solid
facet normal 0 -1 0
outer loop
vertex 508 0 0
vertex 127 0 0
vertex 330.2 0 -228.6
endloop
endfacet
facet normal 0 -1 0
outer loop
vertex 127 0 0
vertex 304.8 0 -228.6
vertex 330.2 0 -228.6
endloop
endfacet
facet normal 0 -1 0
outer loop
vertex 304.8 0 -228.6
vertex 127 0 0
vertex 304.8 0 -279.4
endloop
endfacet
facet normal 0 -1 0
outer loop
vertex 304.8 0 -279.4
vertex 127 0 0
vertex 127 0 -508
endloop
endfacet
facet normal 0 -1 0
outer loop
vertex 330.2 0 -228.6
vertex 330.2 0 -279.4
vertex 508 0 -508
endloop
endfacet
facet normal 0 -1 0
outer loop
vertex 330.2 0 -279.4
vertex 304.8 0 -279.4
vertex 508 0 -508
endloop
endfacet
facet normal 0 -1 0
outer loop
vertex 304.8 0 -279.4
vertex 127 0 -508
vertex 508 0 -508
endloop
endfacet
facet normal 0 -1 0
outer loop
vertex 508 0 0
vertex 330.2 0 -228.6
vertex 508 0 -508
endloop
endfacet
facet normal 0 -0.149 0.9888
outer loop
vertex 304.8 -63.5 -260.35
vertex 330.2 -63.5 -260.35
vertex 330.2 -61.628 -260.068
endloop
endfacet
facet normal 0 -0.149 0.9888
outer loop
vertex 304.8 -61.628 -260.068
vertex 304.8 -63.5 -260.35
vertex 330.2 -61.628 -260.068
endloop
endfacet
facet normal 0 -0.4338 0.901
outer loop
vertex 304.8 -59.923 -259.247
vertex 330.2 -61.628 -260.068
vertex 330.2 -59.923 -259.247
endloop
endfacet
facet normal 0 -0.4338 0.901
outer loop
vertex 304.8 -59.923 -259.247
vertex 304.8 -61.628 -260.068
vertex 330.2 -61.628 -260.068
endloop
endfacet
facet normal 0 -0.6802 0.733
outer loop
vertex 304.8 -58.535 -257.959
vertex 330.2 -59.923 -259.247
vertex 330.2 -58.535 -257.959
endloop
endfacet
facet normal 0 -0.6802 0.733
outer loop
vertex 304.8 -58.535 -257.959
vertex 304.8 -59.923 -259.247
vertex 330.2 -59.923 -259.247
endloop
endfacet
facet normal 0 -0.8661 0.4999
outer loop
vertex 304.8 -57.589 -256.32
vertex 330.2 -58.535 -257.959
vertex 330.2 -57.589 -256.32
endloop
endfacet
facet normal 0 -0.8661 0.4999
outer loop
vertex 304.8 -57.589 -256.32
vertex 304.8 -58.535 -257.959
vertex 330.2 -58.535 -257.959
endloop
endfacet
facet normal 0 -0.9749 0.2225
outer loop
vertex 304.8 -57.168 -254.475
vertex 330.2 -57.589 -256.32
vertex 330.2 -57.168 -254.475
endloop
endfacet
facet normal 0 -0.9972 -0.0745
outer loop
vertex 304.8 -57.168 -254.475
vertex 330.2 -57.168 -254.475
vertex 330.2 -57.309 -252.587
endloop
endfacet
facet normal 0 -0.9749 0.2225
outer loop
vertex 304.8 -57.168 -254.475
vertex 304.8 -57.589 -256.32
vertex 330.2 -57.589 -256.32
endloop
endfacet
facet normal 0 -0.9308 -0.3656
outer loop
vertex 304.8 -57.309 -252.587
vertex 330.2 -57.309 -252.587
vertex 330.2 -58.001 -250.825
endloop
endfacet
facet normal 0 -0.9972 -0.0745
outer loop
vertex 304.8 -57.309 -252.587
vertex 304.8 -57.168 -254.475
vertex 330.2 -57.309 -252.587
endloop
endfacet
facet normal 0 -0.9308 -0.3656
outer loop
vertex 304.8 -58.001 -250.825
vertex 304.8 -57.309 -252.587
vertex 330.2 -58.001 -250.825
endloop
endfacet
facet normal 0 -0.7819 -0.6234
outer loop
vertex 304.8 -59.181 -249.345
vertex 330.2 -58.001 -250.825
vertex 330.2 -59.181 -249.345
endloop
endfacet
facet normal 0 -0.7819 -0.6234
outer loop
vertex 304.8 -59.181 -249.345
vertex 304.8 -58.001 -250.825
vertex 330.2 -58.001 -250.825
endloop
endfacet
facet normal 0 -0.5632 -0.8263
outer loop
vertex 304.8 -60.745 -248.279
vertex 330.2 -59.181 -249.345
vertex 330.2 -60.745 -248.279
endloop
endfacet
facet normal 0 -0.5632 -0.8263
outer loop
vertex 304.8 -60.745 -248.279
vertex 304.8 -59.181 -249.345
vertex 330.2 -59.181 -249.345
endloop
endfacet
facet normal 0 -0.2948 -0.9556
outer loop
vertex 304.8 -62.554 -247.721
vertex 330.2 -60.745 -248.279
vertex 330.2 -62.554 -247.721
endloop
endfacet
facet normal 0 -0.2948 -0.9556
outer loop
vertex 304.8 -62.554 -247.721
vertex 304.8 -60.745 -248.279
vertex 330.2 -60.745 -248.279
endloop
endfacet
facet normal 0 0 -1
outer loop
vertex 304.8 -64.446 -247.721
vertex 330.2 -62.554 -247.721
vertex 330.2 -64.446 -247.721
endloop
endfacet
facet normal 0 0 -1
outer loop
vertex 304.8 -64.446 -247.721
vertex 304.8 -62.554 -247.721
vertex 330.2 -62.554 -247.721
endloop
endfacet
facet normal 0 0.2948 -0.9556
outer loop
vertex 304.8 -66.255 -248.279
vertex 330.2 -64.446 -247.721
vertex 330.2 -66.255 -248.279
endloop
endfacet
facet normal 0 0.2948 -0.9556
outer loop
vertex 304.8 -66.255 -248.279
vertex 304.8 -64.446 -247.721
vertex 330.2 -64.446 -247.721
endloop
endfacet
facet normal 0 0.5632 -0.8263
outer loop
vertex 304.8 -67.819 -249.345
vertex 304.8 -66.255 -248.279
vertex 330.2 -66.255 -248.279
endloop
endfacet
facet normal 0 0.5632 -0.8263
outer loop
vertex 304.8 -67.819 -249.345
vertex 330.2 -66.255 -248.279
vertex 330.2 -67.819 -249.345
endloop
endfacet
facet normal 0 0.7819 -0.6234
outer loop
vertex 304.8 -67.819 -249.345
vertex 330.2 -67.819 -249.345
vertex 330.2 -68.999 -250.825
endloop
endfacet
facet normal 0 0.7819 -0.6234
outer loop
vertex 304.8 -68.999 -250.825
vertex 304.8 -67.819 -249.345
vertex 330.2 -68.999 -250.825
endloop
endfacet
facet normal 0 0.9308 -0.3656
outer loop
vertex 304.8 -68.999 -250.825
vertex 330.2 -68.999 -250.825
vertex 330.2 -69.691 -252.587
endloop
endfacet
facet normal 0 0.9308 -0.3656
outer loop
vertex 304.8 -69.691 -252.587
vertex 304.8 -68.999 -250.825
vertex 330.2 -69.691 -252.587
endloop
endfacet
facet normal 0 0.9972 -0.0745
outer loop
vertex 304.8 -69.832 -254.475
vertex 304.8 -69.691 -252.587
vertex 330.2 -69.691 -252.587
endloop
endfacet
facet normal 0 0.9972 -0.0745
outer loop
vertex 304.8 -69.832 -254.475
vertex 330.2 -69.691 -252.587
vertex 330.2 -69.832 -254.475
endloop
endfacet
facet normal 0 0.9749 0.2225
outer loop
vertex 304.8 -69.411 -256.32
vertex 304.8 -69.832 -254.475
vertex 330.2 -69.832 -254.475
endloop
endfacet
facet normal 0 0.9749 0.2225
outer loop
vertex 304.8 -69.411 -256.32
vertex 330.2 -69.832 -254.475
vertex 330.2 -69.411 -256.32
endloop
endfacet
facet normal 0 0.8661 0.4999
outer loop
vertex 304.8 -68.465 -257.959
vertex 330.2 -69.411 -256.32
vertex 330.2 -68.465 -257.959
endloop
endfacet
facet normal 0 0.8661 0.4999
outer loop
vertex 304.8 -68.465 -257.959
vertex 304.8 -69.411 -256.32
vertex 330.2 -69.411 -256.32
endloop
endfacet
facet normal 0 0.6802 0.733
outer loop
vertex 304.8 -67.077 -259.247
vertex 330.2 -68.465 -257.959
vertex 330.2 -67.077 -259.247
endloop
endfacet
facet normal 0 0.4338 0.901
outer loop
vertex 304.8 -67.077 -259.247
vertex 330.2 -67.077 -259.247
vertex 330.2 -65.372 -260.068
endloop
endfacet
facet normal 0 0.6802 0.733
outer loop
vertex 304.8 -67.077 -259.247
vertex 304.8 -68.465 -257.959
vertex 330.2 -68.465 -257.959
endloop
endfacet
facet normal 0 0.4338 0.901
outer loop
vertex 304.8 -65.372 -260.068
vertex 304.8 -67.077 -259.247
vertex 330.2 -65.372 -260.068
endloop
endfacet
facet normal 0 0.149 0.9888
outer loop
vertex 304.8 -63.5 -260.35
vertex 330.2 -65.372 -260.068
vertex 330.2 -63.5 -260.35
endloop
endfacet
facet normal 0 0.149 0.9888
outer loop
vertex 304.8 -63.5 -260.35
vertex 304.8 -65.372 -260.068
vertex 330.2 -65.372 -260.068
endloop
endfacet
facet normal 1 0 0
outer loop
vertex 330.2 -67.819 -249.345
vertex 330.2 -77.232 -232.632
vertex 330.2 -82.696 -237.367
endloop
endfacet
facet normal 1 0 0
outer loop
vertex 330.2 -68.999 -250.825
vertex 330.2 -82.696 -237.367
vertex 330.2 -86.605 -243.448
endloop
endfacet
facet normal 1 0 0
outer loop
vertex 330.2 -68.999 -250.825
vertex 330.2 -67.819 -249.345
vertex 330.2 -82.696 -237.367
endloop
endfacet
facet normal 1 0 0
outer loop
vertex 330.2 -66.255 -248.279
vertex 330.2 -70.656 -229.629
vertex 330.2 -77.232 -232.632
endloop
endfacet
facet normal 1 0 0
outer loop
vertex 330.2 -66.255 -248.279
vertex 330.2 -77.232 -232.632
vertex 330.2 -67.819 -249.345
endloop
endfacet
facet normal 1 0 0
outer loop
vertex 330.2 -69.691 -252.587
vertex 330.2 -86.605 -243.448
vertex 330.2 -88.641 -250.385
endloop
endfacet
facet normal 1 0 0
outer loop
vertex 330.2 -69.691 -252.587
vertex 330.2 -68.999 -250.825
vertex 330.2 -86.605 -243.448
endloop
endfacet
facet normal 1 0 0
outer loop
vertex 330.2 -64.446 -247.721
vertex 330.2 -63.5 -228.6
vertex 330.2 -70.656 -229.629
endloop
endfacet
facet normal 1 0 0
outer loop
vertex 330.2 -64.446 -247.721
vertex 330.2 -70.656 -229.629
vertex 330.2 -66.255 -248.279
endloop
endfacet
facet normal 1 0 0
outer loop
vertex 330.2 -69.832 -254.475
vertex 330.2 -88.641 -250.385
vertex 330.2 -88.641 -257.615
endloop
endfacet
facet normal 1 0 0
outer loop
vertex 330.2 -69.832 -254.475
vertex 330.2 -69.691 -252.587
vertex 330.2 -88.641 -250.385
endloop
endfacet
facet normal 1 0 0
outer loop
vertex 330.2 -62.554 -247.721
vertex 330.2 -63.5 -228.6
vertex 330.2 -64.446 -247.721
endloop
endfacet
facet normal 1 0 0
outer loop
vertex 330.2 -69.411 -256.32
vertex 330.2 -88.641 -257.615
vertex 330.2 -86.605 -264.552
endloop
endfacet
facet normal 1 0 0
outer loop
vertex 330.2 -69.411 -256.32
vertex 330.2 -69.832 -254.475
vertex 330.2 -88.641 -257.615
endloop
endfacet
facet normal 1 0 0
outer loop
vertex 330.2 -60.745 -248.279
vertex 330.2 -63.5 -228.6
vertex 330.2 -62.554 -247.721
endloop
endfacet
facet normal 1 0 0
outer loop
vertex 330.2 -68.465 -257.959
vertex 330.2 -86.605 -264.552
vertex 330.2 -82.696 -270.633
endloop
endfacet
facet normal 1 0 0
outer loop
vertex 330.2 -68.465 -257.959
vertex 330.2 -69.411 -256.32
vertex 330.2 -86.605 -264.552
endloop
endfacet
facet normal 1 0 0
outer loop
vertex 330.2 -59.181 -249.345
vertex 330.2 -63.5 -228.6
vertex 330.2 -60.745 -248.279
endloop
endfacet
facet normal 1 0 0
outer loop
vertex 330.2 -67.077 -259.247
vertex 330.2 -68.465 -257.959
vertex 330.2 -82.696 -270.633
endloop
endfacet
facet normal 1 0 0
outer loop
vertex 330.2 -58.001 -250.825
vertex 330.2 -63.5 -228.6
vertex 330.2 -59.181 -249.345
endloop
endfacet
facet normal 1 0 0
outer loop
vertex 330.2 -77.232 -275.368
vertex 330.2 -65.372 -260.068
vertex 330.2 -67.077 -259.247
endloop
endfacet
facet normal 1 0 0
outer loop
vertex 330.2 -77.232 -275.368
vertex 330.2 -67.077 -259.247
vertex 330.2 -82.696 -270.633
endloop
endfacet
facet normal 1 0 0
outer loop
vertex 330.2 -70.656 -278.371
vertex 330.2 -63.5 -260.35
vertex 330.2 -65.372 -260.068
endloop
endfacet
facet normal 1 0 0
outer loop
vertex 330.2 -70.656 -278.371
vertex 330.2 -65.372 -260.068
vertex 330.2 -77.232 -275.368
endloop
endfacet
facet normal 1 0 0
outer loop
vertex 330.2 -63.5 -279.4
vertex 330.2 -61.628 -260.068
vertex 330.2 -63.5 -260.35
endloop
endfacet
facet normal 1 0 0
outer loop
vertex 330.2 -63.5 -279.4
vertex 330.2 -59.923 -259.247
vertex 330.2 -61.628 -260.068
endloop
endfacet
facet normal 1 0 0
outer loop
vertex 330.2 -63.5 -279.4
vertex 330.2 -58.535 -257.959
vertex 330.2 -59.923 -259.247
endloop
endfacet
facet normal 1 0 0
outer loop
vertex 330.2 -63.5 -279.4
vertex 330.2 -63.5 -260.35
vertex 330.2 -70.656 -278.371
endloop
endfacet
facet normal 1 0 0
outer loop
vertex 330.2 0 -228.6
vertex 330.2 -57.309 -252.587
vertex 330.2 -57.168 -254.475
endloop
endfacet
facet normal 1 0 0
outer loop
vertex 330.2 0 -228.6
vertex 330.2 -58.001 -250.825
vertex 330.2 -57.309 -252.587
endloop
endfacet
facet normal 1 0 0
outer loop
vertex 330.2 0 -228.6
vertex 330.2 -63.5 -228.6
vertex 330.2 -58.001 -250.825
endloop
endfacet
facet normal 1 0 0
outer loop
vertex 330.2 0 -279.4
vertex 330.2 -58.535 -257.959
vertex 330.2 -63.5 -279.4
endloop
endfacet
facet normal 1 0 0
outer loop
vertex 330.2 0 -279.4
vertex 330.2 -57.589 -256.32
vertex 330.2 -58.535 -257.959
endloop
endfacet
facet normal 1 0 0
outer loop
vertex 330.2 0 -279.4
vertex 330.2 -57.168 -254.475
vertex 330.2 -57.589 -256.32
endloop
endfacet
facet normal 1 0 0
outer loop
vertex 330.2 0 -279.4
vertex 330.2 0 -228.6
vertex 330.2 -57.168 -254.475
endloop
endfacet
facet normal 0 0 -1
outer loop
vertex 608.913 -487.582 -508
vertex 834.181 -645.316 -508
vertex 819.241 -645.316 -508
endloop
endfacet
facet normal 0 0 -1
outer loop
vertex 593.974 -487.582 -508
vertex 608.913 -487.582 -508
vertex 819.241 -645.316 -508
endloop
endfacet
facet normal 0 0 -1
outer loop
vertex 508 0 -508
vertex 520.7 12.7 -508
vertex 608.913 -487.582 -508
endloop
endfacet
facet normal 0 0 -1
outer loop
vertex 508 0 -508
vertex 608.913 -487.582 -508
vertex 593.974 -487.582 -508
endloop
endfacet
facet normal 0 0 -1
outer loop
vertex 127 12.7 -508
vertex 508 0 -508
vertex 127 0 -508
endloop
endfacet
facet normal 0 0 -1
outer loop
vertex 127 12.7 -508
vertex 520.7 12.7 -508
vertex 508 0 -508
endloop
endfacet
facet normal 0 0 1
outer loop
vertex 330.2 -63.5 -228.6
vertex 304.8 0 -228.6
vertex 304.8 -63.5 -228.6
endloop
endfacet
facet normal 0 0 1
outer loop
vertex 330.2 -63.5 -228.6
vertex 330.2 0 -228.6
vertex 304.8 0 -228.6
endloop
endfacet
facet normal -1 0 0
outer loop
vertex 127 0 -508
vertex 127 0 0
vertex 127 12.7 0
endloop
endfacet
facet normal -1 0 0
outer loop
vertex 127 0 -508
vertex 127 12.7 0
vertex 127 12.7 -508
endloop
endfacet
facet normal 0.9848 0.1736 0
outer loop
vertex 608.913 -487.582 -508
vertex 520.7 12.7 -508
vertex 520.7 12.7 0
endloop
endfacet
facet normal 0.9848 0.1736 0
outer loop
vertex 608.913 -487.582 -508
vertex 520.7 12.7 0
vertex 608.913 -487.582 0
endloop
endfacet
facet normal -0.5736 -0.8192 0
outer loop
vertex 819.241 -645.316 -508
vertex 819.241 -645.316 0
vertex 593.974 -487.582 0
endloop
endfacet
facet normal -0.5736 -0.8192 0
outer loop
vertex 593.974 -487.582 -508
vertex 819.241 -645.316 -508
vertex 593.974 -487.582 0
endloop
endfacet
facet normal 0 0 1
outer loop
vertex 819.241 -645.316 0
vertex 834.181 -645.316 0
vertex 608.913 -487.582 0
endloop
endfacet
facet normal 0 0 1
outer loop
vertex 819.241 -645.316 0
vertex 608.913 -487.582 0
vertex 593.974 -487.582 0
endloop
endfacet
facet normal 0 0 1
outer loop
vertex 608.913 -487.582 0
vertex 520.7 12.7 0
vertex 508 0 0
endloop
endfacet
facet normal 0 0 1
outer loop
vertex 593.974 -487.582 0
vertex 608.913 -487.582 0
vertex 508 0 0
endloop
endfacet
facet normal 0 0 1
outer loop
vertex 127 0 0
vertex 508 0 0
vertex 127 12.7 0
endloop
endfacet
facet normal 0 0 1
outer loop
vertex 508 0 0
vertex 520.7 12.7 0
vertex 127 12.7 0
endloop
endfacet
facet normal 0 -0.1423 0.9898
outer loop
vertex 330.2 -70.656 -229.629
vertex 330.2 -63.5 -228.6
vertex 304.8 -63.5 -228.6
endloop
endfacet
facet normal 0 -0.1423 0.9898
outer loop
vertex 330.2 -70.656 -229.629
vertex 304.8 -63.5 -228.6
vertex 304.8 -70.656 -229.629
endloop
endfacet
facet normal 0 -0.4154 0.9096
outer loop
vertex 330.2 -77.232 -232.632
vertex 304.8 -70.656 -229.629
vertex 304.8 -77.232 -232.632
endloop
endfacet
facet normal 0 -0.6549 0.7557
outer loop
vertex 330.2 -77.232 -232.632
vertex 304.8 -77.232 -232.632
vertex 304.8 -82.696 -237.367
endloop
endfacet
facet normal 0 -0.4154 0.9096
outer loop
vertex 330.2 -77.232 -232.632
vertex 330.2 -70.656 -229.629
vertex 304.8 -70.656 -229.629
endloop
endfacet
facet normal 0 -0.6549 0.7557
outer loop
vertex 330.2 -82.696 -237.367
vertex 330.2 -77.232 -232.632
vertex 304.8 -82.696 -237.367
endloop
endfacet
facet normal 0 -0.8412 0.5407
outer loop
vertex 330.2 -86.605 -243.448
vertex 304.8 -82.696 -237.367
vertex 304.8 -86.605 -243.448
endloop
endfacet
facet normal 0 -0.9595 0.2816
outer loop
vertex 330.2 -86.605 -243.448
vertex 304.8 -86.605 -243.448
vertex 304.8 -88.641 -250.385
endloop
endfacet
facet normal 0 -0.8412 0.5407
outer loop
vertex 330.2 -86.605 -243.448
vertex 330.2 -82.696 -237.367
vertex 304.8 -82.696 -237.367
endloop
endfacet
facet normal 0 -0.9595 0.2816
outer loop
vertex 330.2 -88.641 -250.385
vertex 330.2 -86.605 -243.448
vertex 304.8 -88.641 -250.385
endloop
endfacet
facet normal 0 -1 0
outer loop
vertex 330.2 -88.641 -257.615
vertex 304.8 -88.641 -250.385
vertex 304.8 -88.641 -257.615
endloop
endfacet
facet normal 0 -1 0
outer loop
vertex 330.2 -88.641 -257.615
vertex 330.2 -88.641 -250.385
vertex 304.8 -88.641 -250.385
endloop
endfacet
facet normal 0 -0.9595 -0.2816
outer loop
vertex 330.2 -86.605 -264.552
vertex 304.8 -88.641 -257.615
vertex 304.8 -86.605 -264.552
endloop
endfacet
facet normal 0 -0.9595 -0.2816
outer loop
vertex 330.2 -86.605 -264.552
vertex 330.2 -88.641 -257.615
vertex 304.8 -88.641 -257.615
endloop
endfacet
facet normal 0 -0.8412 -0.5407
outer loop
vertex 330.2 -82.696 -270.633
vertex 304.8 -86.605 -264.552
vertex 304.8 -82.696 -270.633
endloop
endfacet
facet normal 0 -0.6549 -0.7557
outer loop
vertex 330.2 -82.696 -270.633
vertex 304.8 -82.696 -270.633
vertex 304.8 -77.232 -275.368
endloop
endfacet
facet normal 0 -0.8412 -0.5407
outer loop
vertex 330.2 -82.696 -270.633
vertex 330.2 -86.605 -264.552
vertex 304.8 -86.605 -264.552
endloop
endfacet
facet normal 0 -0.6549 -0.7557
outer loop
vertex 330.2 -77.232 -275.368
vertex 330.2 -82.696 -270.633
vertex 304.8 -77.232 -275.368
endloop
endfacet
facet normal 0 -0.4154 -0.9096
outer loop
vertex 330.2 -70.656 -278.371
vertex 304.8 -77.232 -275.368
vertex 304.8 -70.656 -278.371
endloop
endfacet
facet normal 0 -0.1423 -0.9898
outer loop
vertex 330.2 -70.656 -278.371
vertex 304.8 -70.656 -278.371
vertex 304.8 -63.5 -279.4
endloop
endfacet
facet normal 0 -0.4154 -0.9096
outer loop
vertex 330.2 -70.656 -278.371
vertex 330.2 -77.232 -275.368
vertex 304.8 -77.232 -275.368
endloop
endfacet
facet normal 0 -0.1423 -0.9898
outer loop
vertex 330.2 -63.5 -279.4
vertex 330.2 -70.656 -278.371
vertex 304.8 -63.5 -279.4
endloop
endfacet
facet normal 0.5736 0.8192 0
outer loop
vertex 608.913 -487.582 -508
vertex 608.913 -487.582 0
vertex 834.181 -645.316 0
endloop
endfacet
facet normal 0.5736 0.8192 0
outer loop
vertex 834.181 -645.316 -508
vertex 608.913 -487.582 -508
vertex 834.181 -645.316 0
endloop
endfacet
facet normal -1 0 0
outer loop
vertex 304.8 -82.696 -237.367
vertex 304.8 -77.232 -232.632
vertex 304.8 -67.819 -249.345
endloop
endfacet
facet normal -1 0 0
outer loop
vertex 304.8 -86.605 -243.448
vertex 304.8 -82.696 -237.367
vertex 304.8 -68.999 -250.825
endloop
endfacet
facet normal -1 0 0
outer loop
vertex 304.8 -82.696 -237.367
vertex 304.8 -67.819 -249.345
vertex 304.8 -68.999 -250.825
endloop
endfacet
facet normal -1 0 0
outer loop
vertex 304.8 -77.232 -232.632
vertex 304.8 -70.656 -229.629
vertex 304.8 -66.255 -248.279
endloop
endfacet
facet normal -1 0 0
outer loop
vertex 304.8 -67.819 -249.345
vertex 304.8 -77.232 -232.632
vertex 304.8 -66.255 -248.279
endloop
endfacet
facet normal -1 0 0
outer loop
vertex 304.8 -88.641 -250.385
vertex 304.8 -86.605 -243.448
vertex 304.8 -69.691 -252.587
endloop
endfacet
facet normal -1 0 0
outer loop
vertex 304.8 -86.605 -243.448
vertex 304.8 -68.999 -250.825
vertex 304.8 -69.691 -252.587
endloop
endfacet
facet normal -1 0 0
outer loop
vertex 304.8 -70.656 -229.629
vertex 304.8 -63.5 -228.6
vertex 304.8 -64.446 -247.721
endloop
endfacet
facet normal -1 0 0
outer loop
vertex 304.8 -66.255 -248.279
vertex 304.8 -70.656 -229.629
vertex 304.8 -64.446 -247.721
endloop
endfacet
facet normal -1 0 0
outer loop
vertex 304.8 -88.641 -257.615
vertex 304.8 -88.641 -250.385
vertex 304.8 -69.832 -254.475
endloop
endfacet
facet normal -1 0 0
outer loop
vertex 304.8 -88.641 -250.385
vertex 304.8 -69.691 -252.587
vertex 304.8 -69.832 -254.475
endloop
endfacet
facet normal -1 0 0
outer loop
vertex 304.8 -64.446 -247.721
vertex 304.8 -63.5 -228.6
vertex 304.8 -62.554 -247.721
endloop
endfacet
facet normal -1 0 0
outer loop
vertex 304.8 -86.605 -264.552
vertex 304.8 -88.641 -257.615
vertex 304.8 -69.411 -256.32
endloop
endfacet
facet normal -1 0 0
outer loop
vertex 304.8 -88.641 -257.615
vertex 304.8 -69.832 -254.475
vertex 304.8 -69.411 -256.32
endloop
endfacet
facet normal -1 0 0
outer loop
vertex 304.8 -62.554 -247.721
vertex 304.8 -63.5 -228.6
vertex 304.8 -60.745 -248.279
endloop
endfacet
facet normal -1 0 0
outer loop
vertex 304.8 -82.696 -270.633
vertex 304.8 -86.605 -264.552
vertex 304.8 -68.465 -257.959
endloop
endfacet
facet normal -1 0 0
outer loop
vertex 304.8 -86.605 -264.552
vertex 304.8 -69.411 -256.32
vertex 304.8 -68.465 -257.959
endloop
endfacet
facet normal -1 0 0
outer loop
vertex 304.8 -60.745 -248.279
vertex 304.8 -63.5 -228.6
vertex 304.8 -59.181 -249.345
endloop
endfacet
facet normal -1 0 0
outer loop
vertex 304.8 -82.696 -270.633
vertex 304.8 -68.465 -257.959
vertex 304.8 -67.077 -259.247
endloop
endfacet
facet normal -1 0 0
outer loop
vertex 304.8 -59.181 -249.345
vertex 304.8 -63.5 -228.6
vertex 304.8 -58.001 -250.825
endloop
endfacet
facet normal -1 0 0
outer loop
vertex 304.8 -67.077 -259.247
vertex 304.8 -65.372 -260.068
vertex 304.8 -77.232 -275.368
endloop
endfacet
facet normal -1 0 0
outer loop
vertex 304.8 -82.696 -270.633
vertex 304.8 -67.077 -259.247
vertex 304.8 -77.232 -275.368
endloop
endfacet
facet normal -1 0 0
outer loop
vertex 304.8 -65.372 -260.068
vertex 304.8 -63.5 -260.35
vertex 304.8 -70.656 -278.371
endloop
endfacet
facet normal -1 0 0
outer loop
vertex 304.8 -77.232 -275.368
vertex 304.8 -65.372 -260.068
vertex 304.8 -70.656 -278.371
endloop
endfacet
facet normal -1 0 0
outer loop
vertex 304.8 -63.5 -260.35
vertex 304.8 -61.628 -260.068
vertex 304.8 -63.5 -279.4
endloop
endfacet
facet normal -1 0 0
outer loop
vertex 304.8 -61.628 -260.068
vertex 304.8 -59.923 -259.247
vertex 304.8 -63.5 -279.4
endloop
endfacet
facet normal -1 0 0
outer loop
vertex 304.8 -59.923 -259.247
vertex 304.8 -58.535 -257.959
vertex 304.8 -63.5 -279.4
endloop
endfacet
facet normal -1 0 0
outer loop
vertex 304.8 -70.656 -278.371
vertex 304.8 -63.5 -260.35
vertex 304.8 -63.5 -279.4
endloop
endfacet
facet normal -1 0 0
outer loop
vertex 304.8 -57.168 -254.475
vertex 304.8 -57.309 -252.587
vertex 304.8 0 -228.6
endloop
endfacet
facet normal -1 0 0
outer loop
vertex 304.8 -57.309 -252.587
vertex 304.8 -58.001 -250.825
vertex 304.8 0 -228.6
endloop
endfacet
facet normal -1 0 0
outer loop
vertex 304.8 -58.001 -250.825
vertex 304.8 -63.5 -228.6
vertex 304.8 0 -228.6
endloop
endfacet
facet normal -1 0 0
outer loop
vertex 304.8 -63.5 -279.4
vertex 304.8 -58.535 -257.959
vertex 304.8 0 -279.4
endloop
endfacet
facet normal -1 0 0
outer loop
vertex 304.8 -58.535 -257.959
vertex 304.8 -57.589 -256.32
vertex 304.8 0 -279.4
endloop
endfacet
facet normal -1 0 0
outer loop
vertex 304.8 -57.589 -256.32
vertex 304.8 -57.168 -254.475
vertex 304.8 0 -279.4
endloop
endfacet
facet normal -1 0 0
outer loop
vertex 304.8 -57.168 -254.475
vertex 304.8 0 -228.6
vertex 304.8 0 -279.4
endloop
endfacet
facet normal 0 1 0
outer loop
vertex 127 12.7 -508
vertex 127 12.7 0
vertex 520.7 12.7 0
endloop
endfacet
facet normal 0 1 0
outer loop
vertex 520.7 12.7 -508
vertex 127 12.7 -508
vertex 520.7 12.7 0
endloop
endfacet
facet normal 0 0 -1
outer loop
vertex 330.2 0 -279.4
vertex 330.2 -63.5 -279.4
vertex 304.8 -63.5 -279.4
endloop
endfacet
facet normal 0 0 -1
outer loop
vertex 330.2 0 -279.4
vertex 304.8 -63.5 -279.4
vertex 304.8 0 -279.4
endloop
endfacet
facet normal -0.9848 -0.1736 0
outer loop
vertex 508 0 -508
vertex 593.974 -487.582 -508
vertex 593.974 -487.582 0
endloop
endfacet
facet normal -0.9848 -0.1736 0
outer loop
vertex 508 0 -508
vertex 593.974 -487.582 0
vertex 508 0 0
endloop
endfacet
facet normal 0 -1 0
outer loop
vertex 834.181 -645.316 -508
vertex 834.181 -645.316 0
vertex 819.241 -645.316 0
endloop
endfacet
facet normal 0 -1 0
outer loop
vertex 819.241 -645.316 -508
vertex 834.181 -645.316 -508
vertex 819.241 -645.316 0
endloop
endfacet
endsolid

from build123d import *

# Parameters (mm, degrees)
SKETCH1_W           = 381
SKETCH1_H           = 508
BOSS_EXTRUDE1_DEPTH = 12.7
SKETCH3_R           = 6.35
BOSS_EXTRUDE2_DEPTH = 12.7
BOSS_EXTRUDE4_DEPTH = 508


with BuildPart() as part:
    # Sketch1 → Boss-Extrude1 (new body)
    with BuildSketch(Plane(origin=(0, 0, 0), x_dir=(1, 0, 0), z_dir=(0, 1, 0))):
        with Locations((317.5, 254)):
            Rectangle(SKETCH1_W, SKETCH1_H)
    extrude(amount=BOSS_EXTRUDE1_DEPTH)

    # Sketch3 → Boss-Extrude2 (add, symmetric)
    with BuildSketch(Plane(origin=(317.5, 0, 0), x_dir=(0, 0, -1), z_dir=(1, 0, 0))):
        with BuildLine():
            Line((228.6, 0), (228.6, -63.5))
            ThreePointArc((228.6, -63.5), (254, -88.9), (279.4, -63.5))
            Line((279.4, -63.5), (279.4, 0))
            Line((279.4, 0), (228.6, 0))
        make_face()
        with Locations((254, -63.5)):
            Circle(SKETCH3_R, mode=Mode.SUBTRACT)
    extrude(amount=BOSS_EXTRUDE2_DEPTH, both=True)

    # Sketch6 → Boss-Extrude4 (add)
    with BuildSketch(Plane.XY):
        Polygon((520.7, 12.7), (608.913274255, -487.58233853), (834.18077195, -645.31633853), (819.241419295, -645.31633853), (593.9739216, -487.58233853), (508, 0), (508, 12.7), align=None)
    extrude(amount=-BOSS_EXTRUDE4_DEPTH)


solid = part.part
